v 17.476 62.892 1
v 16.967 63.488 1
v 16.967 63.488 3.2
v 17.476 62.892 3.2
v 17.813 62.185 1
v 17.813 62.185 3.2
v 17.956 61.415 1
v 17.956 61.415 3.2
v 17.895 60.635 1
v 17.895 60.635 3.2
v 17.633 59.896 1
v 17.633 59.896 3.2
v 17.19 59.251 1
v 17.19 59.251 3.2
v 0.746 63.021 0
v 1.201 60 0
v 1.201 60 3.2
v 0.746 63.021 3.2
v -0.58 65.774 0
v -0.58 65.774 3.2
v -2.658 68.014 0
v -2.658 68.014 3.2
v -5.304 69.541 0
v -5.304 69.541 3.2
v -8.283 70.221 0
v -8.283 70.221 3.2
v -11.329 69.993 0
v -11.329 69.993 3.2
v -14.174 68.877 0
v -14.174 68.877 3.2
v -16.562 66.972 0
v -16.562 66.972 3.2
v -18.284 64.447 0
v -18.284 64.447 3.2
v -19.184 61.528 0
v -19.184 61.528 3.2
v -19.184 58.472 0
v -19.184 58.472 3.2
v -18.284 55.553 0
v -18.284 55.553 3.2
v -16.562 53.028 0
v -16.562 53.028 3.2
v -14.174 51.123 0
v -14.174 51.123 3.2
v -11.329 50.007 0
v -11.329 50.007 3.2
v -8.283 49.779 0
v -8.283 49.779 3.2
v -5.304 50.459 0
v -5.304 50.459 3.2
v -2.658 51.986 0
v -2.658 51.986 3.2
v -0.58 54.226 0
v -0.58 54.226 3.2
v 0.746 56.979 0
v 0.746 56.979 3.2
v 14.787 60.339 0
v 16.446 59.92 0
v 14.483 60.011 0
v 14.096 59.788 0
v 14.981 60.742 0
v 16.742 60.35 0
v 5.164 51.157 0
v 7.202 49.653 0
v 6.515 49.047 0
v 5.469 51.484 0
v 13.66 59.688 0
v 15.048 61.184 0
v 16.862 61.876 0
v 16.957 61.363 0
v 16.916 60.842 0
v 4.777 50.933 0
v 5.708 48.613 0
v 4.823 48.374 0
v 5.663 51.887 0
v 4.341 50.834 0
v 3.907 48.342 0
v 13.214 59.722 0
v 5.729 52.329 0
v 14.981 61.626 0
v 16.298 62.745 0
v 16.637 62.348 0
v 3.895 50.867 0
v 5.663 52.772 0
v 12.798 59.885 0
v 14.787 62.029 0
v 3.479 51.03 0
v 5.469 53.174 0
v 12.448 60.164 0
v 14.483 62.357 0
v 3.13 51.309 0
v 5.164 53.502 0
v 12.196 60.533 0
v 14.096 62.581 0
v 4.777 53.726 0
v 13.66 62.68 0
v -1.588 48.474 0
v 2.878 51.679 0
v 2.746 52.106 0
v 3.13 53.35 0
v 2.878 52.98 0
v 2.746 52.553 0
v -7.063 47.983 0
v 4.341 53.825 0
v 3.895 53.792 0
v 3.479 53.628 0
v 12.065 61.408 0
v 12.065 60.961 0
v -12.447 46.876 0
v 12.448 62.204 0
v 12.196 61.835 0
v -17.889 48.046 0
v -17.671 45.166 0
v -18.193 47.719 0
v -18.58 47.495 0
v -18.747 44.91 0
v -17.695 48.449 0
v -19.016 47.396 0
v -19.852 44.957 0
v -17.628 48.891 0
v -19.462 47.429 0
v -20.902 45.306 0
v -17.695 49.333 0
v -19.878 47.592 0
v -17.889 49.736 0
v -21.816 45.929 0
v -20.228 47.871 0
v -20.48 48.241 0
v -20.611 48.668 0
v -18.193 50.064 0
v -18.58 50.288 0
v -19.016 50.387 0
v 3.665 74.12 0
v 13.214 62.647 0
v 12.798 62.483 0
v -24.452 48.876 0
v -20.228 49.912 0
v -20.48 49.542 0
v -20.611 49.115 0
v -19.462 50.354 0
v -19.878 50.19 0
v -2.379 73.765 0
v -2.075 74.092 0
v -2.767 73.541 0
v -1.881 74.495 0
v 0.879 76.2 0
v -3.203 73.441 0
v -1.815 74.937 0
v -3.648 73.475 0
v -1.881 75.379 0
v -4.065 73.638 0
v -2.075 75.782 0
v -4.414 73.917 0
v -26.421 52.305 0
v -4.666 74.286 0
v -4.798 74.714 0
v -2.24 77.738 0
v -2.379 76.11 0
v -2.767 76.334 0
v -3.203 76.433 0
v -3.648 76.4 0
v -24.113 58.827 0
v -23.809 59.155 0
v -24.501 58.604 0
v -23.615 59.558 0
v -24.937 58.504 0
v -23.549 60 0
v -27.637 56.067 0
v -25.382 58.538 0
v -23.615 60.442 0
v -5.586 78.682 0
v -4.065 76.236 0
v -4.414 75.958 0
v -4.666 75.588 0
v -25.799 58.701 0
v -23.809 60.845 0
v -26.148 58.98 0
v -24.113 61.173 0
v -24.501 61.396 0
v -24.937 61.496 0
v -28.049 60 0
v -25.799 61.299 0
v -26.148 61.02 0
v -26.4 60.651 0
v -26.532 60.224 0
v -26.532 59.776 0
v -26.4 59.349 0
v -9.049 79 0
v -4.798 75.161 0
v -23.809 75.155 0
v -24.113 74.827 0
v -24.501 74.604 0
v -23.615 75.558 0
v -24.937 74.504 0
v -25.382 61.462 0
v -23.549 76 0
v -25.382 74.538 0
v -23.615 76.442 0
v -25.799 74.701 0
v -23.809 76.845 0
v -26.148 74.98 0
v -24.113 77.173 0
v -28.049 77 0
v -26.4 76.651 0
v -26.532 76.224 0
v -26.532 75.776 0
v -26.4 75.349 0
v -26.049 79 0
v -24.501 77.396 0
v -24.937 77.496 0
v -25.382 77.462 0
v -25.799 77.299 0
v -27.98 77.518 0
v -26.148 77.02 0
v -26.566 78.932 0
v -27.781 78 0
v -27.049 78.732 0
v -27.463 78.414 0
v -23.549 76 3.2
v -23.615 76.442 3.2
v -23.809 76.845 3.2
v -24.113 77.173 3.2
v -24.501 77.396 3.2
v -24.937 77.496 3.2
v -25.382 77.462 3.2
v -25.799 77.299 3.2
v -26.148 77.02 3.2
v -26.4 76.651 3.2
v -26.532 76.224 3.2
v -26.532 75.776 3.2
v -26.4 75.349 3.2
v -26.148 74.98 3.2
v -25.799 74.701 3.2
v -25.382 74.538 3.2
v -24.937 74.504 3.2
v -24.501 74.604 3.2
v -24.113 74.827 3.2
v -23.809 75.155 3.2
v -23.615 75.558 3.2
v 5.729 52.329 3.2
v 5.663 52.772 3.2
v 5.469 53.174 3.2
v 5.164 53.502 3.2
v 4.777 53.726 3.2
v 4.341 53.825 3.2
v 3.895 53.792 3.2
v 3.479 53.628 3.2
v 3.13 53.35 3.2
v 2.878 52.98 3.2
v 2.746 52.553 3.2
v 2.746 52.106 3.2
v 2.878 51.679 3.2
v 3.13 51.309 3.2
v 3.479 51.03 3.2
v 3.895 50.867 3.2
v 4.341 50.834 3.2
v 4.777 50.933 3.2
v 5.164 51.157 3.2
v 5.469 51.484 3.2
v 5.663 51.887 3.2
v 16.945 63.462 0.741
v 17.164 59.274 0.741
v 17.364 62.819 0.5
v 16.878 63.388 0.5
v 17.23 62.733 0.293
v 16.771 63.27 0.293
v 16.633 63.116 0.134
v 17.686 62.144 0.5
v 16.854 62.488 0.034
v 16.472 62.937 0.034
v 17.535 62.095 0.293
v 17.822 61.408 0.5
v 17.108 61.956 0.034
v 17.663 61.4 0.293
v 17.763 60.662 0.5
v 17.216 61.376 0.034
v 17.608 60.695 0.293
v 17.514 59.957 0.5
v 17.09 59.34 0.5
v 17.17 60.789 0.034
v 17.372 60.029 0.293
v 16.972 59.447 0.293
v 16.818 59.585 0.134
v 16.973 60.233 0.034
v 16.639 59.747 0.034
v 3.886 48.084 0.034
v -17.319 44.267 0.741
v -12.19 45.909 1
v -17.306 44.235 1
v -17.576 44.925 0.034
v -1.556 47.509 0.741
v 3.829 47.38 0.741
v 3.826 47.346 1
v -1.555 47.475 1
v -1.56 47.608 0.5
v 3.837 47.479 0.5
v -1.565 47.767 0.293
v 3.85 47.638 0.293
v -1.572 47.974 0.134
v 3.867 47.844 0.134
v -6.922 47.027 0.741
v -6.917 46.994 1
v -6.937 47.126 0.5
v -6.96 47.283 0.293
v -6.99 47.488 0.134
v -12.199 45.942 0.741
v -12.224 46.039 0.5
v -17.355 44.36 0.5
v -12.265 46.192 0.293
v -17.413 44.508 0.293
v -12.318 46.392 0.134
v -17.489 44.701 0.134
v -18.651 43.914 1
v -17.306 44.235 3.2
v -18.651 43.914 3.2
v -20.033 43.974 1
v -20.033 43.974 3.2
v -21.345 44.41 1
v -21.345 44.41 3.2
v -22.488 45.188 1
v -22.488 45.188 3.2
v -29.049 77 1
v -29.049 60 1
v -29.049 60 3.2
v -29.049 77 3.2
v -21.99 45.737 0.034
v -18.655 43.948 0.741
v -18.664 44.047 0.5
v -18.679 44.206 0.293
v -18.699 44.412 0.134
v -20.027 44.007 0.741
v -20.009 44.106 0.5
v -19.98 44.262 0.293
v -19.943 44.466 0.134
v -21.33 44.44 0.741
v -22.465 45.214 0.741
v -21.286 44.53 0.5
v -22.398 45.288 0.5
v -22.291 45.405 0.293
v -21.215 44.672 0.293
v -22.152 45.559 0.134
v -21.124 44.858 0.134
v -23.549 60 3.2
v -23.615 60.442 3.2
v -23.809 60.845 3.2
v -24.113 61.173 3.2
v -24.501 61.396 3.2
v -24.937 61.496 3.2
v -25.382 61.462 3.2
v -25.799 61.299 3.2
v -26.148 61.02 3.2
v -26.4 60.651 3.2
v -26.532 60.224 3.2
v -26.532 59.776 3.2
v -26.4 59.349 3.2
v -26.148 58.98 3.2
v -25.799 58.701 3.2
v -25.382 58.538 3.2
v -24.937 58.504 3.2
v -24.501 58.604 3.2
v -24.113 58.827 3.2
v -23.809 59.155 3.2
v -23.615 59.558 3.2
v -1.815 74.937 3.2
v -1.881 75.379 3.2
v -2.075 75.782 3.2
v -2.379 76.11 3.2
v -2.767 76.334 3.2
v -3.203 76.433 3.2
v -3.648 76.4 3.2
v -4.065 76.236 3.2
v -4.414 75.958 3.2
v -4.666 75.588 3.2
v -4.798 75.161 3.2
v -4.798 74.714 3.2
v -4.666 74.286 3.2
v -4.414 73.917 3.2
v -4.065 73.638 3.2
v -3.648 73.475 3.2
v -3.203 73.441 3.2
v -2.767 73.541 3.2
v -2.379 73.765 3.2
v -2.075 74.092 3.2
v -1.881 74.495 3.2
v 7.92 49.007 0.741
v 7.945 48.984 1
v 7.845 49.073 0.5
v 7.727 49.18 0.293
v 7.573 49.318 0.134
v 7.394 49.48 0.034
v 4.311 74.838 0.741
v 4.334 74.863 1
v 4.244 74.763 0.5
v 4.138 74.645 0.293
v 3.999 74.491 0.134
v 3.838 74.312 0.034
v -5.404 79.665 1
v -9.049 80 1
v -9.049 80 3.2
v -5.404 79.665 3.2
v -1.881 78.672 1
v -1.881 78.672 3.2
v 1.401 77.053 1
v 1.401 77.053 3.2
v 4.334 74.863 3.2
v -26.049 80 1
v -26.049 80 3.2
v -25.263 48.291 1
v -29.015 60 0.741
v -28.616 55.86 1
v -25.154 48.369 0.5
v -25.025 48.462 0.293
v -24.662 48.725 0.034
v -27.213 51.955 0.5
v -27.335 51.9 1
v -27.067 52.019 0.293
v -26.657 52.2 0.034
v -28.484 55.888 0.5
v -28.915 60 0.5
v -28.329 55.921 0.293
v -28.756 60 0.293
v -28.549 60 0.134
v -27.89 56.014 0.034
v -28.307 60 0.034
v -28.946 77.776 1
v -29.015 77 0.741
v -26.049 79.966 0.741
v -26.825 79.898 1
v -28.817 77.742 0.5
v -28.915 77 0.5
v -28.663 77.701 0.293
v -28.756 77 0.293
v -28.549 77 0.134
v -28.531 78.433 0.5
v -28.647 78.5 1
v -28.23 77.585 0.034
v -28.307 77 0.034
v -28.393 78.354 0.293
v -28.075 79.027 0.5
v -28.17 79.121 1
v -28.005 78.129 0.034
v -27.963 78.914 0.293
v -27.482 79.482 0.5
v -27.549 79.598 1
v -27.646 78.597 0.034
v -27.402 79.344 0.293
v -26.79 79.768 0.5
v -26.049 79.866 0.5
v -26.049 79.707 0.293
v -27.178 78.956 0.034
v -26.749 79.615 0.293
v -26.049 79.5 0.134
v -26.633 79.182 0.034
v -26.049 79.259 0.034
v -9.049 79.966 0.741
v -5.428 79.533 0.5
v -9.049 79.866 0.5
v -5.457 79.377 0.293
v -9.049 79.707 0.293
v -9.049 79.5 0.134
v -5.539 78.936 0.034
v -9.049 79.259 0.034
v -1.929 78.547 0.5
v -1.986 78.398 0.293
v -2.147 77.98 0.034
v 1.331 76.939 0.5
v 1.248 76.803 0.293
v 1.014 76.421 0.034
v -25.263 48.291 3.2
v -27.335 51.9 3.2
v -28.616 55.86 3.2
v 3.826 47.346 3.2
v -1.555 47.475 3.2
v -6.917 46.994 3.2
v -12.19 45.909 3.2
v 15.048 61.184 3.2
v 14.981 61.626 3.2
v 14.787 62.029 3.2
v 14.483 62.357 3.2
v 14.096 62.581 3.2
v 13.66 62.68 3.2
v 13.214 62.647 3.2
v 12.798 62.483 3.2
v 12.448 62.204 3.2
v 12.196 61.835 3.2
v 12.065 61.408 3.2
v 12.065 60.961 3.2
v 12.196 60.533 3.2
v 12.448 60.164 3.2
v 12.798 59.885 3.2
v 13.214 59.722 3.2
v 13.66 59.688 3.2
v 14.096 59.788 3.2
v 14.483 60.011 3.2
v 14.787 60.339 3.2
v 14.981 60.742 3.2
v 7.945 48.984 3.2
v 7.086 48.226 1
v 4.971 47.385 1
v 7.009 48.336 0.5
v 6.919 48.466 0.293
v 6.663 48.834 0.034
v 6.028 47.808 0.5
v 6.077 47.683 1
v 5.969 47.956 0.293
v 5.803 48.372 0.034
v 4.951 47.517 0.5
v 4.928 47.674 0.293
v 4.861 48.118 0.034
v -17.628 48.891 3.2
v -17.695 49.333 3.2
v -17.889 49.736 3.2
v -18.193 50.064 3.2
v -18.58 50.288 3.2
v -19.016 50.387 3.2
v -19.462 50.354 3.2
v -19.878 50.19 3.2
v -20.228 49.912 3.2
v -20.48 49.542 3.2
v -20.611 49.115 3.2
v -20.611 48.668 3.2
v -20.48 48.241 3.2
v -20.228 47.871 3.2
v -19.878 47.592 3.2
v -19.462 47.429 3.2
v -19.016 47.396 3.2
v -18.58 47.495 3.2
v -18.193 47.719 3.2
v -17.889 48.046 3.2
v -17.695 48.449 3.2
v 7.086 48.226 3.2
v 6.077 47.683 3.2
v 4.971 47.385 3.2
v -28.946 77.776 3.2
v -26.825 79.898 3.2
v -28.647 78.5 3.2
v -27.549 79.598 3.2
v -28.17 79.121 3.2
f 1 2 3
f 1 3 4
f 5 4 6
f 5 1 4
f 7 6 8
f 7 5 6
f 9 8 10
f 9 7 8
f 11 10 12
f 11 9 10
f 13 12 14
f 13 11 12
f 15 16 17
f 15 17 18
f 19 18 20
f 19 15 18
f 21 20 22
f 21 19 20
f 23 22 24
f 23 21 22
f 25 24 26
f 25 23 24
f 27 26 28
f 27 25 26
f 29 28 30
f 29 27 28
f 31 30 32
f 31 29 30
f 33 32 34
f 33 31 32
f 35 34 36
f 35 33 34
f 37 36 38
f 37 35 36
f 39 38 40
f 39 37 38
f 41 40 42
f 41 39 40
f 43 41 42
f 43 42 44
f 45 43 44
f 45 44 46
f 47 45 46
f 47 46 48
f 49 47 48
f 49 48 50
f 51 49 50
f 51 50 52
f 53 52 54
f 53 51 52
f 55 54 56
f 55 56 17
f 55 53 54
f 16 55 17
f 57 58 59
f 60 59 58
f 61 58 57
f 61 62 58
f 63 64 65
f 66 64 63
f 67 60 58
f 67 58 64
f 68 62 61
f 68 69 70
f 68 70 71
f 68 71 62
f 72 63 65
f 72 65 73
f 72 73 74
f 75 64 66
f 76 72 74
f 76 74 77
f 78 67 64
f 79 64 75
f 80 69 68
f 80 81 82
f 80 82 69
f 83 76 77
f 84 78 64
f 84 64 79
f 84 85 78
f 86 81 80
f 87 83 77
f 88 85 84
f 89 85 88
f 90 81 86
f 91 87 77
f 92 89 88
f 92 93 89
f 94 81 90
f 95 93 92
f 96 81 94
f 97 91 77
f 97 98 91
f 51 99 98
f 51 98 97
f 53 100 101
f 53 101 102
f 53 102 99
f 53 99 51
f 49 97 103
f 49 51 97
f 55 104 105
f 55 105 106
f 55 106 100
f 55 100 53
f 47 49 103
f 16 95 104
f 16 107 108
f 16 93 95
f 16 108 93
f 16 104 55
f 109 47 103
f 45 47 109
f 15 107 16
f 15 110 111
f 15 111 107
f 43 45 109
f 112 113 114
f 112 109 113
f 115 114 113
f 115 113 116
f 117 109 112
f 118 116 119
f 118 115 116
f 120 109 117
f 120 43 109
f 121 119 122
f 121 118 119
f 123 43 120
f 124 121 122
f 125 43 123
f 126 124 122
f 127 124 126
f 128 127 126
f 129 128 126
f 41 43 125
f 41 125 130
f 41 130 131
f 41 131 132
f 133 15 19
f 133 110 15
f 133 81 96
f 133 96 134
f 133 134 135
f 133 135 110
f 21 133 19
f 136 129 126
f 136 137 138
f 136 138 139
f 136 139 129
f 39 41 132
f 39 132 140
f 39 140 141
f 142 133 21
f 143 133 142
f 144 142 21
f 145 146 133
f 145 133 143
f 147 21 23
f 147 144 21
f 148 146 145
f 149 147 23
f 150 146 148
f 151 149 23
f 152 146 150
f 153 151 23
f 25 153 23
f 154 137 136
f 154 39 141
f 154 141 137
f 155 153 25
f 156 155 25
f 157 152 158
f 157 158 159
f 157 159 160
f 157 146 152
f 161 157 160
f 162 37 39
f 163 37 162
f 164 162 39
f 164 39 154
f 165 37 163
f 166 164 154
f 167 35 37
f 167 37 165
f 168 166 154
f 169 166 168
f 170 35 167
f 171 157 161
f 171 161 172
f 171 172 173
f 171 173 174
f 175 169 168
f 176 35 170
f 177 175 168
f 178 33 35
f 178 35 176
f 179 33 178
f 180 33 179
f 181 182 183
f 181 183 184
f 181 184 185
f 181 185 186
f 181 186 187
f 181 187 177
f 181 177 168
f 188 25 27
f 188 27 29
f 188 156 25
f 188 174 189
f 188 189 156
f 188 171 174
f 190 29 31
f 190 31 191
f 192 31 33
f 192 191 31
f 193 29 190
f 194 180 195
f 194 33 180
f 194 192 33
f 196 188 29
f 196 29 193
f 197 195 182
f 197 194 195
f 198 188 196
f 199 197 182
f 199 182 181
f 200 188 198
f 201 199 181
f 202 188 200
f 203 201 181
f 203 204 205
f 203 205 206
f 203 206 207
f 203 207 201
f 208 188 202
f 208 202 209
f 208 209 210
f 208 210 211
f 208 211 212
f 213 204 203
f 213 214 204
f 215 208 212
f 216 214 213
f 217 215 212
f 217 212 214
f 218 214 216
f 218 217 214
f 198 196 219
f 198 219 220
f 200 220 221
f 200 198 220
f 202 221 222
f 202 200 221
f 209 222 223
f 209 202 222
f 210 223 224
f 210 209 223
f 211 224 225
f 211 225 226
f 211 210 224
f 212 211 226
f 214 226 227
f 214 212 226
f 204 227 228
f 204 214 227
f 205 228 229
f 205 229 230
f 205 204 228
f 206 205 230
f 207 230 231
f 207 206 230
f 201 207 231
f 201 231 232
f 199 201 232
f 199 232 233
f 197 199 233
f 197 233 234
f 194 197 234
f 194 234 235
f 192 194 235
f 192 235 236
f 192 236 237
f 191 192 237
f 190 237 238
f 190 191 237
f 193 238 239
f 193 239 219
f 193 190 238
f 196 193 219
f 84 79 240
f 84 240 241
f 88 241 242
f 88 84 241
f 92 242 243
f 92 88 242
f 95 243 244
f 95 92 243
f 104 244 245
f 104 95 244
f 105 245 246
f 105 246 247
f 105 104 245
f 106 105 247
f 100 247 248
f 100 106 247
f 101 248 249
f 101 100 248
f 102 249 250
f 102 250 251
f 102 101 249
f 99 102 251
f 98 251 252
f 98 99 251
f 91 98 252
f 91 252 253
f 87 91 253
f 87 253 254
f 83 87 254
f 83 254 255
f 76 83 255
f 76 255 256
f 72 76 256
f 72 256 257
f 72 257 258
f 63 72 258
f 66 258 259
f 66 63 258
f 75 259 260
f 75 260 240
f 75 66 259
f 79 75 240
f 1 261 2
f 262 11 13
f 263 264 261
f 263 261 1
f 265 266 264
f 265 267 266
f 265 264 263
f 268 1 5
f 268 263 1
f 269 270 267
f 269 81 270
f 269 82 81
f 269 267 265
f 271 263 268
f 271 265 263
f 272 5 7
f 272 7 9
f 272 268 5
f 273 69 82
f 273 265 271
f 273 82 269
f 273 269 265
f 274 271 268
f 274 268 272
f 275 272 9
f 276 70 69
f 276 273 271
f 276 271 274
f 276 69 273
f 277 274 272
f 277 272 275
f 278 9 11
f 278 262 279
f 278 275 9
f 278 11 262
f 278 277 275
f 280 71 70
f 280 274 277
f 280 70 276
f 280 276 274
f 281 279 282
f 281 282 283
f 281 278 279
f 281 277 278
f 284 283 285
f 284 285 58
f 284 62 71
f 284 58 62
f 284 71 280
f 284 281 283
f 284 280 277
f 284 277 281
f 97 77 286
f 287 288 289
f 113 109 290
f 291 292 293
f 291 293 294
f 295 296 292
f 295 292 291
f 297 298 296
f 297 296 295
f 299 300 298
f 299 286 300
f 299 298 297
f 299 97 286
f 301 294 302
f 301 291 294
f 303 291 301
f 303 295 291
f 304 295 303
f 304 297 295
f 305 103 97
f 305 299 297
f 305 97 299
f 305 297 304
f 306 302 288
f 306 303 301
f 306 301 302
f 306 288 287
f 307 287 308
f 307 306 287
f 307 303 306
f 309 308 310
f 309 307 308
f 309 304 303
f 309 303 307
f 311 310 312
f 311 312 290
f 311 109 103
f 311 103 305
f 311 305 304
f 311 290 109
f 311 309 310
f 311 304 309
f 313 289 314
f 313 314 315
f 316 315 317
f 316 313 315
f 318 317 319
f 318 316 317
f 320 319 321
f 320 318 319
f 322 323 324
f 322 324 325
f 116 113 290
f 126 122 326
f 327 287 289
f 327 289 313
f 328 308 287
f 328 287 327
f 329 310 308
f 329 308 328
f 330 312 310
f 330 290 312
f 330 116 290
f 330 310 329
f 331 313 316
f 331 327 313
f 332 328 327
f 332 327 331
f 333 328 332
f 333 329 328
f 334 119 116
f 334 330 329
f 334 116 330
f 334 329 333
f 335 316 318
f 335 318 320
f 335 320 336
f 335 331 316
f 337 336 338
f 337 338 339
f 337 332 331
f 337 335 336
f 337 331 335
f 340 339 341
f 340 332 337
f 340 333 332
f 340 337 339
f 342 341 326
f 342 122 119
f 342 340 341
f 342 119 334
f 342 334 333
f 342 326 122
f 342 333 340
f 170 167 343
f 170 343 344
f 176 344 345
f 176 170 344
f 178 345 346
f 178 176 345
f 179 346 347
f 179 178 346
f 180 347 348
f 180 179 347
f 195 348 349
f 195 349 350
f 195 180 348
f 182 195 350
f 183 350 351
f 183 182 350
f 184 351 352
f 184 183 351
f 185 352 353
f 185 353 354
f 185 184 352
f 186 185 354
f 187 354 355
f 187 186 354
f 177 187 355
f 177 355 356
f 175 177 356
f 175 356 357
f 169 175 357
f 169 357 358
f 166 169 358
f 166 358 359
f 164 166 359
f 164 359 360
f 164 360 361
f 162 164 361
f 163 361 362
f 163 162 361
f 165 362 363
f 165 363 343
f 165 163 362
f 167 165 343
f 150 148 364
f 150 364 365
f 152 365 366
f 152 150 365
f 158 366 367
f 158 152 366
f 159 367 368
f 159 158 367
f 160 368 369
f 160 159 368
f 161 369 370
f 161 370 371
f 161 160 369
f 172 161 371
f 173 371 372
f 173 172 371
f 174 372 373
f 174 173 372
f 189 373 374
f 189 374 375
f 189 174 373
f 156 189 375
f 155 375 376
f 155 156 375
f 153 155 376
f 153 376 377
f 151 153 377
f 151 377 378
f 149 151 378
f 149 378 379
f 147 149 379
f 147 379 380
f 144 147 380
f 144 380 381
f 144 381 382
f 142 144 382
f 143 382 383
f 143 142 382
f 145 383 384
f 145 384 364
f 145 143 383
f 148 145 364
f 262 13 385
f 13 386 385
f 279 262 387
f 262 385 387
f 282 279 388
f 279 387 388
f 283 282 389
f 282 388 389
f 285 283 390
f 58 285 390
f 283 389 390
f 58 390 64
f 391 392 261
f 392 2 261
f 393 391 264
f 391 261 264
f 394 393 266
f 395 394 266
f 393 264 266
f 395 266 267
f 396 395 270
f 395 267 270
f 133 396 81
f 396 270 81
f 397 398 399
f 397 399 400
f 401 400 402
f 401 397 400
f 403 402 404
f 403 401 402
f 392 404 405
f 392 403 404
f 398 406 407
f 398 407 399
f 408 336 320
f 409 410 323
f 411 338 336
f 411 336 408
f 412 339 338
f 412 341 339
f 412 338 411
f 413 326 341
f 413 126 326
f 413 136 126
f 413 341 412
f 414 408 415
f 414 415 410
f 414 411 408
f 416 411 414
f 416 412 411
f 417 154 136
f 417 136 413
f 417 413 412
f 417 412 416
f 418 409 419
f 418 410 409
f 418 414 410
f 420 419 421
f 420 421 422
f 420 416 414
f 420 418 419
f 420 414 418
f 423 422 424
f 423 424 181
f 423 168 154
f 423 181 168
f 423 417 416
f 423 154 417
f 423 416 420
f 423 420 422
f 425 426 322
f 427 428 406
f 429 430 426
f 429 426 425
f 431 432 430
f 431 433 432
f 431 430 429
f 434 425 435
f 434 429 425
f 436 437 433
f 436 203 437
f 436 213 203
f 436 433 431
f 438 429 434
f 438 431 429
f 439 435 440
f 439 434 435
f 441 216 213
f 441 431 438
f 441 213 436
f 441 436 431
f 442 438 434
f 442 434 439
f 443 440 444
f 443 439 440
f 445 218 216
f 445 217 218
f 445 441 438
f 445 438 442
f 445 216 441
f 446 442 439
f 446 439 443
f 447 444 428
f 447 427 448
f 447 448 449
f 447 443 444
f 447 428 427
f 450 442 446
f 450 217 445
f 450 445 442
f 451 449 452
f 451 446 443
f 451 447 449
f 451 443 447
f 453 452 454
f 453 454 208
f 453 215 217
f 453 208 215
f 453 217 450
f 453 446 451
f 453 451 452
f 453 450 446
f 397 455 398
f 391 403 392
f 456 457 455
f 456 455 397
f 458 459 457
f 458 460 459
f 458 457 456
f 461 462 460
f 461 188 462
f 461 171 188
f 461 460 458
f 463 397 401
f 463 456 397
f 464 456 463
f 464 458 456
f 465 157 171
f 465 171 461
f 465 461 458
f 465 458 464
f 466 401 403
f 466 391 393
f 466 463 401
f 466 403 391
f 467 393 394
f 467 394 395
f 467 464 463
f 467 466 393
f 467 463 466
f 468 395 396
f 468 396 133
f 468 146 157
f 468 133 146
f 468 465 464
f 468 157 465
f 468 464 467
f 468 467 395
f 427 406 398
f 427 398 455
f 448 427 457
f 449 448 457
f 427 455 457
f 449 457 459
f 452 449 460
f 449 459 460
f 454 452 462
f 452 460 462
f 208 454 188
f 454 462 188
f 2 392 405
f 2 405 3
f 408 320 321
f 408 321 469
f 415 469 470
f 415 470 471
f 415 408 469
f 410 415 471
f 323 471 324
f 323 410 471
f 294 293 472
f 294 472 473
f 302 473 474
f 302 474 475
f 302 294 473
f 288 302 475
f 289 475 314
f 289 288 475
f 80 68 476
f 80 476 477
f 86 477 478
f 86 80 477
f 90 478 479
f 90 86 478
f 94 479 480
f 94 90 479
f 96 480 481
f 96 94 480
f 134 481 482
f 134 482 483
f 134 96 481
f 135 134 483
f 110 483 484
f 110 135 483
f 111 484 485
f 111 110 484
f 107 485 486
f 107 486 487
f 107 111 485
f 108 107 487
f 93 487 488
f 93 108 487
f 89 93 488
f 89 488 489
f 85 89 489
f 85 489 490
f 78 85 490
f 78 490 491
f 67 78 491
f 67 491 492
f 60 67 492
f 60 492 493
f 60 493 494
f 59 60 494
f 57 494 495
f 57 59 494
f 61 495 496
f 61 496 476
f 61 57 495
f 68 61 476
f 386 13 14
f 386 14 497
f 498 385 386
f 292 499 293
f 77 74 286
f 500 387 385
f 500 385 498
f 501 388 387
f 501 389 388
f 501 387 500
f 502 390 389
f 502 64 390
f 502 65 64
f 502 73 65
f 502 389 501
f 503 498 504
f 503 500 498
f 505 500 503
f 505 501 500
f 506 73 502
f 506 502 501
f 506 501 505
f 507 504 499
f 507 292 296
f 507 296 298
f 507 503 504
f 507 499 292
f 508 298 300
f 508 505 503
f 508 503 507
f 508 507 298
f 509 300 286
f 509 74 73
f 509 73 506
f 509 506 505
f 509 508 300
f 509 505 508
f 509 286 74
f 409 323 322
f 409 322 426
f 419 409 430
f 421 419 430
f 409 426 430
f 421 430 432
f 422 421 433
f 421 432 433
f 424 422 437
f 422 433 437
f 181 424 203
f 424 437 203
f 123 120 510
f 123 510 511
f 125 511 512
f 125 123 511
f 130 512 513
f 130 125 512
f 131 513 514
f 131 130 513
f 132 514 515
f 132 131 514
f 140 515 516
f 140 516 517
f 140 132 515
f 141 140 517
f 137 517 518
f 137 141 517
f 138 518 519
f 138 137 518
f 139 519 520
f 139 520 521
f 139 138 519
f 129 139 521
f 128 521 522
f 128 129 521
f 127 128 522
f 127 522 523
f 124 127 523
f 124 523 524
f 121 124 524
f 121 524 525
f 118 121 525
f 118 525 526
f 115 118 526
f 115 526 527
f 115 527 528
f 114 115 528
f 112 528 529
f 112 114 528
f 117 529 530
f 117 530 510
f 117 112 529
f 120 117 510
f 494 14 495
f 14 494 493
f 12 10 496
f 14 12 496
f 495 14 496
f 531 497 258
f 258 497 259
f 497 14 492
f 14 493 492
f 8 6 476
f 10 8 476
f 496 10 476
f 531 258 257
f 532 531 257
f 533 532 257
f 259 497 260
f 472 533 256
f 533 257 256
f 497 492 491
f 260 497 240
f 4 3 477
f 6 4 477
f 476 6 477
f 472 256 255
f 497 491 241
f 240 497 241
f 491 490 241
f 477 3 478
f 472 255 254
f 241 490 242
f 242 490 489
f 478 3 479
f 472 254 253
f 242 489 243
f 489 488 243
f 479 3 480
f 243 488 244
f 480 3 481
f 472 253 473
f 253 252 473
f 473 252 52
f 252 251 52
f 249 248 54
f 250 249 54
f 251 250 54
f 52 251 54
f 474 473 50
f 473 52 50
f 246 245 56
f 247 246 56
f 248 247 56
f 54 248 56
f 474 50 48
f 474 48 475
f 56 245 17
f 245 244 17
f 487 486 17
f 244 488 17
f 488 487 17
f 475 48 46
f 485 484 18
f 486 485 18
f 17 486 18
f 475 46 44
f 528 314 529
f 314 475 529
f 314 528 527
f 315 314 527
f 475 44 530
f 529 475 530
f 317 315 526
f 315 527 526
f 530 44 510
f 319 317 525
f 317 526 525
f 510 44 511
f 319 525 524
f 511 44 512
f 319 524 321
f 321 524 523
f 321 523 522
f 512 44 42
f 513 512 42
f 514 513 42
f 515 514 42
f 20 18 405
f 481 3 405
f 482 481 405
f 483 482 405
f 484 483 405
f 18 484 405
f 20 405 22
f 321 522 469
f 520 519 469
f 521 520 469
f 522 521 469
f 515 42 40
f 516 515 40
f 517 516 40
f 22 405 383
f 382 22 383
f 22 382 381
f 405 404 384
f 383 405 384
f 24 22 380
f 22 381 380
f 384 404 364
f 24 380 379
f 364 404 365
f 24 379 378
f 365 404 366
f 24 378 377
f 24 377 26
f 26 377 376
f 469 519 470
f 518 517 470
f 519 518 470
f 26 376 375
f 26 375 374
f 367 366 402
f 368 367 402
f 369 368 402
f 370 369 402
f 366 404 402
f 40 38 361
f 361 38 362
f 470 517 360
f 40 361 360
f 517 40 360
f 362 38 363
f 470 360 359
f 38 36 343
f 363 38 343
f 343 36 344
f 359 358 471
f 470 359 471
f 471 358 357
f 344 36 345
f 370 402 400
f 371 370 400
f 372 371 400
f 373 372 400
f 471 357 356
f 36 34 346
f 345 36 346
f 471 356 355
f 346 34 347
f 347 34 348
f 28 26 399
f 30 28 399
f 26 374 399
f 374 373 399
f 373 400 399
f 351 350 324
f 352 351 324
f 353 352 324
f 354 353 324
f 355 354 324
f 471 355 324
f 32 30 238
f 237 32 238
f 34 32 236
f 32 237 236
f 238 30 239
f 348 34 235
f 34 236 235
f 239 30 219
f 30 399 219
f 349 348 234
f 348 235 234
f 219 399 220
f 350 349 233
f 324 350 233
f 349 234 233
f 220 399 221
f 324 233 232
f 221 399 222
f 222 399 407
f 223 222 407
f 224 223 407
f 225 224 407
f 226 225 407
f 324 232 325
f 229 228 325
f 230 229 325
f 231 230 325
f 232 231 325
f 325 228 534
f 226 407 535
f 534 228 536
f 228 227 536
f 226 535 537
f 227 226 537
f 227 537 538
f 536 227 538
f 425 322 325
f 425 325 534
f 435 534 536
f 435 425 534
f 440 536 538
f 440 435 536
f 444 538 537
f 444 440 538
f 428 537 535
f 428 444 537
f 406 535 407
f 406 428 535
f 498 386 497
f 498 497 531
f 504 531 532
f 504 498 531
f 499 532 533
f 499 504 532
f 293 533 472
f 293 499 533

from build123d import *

# Parameters (mm, degrees)
SKETCH_1_R      = 10.25
SKETCH_1_R_2    = 1.5
EXTRUDE_1_DEPTH = 3.2
FILLET_1_R      = 1


with BuildPart() as part:
    # 草图1 → 凸台-拉伸1 (new body)
    with BuildSketch(Plane.XY):
        with BuildLine():
            Line((4.334015044, 74.86289651), (16.967477077, 63.487676201))
            ThreePointArc((16.967477077, 63.487676201), (17.955973862, 61.415249594), (17.189519734, 59.250849906))
            Line((17.189519734, 59.250849906), (7.944957082, 48.983722931))
            ThreePointArc((7.944957082, 48.983722931), (6.077132686, 47.683381281), (3.826448864, 47.345625871))
            ThreePointArc((3.826448864, 47.345625871), (-6.917114554, 46.993654106), (-17.306435746, 44.235023248))
            ThreePointArc((-17.306435746, 44.235023248), (-20.032995202, 43.973894607), (-22.488022071, 45.188455313))
            ThreePointArc((-22.488022071, 45.188455313), (-27.335046982, 51.900262342), (-29.048597084, 60))
            Line((-29.048597084, 60), (-29.048597084, 77))
            ThreePointArc((-29.048597084, 77), (-28.169917427, 79.121320344), (-26.048597084, 80))
            Line((-26.048597084, 80), (-9.048597084, 80))
            ThreePointArc((-9.048597084, 80), (-1.881238093, 78.67160853), (4.334015044, 74.86289651))
        make_face()
        with Locations((-9.048597084, 60)):
            Circle(SKETCH_1_R, mode=Mode.SUBTRACT)
        with Locations((-25.048597084, 76)):
            Circle(SKETCH_1_R_2, mode=Mode.SUBTRACT)
        with Locations((-3.314709891, 74.937286824)):
            Circle(SKETCH_1_R_2, mode=Mode.SUBTRACT)
        with Locations((-25.048597084, 60)):
            Circle(SKETCH_1_R_2, mode=Mode.SUBTRACT)
        with Locations((-19.128165824, 48.891341485)):
            Circle(SKETCH_1_R_2, mode=Mode.SUBTRACT)
        with Locations((4.229232955, 52.329375962)):
            Circle(SKETCH_1_R_2, mode=Mode.SUBTRACT)
        with Locations((13.547809826, 61.184227506)):
            Circle(SKETCH_1_R_2, mode=Mode.SUBTRACT)
    extrude(amount=EXTRUDE_1_DEPTH)

    # 圆角1
    fillet_1_edges = [part.edges().sort_by_distance(p)[0] for p in [
        (-29.048597084, 68.5, 0),
        (-28.169917427, 79.121320344, 0),
        (-17.548597084, 80, 0),
        (-1.881238093, 78.67160853, 0),
        (10.65074606, 69.175286355, 0),
        (17.955973862, 61.415249594, 0),
        (12.567238408, 54.117286418, 0),
        (6.077132686, 47.683381281, 0),
        (-6.917114554, 46.993654106, 0),
        (-20.032995202, 43.973894607, 0),
        (-27.335046982, 51.900262342, 0),
    ]]
    fillet(fillet_1_edges, radius=FILLET_1_R)


solid = part.part
